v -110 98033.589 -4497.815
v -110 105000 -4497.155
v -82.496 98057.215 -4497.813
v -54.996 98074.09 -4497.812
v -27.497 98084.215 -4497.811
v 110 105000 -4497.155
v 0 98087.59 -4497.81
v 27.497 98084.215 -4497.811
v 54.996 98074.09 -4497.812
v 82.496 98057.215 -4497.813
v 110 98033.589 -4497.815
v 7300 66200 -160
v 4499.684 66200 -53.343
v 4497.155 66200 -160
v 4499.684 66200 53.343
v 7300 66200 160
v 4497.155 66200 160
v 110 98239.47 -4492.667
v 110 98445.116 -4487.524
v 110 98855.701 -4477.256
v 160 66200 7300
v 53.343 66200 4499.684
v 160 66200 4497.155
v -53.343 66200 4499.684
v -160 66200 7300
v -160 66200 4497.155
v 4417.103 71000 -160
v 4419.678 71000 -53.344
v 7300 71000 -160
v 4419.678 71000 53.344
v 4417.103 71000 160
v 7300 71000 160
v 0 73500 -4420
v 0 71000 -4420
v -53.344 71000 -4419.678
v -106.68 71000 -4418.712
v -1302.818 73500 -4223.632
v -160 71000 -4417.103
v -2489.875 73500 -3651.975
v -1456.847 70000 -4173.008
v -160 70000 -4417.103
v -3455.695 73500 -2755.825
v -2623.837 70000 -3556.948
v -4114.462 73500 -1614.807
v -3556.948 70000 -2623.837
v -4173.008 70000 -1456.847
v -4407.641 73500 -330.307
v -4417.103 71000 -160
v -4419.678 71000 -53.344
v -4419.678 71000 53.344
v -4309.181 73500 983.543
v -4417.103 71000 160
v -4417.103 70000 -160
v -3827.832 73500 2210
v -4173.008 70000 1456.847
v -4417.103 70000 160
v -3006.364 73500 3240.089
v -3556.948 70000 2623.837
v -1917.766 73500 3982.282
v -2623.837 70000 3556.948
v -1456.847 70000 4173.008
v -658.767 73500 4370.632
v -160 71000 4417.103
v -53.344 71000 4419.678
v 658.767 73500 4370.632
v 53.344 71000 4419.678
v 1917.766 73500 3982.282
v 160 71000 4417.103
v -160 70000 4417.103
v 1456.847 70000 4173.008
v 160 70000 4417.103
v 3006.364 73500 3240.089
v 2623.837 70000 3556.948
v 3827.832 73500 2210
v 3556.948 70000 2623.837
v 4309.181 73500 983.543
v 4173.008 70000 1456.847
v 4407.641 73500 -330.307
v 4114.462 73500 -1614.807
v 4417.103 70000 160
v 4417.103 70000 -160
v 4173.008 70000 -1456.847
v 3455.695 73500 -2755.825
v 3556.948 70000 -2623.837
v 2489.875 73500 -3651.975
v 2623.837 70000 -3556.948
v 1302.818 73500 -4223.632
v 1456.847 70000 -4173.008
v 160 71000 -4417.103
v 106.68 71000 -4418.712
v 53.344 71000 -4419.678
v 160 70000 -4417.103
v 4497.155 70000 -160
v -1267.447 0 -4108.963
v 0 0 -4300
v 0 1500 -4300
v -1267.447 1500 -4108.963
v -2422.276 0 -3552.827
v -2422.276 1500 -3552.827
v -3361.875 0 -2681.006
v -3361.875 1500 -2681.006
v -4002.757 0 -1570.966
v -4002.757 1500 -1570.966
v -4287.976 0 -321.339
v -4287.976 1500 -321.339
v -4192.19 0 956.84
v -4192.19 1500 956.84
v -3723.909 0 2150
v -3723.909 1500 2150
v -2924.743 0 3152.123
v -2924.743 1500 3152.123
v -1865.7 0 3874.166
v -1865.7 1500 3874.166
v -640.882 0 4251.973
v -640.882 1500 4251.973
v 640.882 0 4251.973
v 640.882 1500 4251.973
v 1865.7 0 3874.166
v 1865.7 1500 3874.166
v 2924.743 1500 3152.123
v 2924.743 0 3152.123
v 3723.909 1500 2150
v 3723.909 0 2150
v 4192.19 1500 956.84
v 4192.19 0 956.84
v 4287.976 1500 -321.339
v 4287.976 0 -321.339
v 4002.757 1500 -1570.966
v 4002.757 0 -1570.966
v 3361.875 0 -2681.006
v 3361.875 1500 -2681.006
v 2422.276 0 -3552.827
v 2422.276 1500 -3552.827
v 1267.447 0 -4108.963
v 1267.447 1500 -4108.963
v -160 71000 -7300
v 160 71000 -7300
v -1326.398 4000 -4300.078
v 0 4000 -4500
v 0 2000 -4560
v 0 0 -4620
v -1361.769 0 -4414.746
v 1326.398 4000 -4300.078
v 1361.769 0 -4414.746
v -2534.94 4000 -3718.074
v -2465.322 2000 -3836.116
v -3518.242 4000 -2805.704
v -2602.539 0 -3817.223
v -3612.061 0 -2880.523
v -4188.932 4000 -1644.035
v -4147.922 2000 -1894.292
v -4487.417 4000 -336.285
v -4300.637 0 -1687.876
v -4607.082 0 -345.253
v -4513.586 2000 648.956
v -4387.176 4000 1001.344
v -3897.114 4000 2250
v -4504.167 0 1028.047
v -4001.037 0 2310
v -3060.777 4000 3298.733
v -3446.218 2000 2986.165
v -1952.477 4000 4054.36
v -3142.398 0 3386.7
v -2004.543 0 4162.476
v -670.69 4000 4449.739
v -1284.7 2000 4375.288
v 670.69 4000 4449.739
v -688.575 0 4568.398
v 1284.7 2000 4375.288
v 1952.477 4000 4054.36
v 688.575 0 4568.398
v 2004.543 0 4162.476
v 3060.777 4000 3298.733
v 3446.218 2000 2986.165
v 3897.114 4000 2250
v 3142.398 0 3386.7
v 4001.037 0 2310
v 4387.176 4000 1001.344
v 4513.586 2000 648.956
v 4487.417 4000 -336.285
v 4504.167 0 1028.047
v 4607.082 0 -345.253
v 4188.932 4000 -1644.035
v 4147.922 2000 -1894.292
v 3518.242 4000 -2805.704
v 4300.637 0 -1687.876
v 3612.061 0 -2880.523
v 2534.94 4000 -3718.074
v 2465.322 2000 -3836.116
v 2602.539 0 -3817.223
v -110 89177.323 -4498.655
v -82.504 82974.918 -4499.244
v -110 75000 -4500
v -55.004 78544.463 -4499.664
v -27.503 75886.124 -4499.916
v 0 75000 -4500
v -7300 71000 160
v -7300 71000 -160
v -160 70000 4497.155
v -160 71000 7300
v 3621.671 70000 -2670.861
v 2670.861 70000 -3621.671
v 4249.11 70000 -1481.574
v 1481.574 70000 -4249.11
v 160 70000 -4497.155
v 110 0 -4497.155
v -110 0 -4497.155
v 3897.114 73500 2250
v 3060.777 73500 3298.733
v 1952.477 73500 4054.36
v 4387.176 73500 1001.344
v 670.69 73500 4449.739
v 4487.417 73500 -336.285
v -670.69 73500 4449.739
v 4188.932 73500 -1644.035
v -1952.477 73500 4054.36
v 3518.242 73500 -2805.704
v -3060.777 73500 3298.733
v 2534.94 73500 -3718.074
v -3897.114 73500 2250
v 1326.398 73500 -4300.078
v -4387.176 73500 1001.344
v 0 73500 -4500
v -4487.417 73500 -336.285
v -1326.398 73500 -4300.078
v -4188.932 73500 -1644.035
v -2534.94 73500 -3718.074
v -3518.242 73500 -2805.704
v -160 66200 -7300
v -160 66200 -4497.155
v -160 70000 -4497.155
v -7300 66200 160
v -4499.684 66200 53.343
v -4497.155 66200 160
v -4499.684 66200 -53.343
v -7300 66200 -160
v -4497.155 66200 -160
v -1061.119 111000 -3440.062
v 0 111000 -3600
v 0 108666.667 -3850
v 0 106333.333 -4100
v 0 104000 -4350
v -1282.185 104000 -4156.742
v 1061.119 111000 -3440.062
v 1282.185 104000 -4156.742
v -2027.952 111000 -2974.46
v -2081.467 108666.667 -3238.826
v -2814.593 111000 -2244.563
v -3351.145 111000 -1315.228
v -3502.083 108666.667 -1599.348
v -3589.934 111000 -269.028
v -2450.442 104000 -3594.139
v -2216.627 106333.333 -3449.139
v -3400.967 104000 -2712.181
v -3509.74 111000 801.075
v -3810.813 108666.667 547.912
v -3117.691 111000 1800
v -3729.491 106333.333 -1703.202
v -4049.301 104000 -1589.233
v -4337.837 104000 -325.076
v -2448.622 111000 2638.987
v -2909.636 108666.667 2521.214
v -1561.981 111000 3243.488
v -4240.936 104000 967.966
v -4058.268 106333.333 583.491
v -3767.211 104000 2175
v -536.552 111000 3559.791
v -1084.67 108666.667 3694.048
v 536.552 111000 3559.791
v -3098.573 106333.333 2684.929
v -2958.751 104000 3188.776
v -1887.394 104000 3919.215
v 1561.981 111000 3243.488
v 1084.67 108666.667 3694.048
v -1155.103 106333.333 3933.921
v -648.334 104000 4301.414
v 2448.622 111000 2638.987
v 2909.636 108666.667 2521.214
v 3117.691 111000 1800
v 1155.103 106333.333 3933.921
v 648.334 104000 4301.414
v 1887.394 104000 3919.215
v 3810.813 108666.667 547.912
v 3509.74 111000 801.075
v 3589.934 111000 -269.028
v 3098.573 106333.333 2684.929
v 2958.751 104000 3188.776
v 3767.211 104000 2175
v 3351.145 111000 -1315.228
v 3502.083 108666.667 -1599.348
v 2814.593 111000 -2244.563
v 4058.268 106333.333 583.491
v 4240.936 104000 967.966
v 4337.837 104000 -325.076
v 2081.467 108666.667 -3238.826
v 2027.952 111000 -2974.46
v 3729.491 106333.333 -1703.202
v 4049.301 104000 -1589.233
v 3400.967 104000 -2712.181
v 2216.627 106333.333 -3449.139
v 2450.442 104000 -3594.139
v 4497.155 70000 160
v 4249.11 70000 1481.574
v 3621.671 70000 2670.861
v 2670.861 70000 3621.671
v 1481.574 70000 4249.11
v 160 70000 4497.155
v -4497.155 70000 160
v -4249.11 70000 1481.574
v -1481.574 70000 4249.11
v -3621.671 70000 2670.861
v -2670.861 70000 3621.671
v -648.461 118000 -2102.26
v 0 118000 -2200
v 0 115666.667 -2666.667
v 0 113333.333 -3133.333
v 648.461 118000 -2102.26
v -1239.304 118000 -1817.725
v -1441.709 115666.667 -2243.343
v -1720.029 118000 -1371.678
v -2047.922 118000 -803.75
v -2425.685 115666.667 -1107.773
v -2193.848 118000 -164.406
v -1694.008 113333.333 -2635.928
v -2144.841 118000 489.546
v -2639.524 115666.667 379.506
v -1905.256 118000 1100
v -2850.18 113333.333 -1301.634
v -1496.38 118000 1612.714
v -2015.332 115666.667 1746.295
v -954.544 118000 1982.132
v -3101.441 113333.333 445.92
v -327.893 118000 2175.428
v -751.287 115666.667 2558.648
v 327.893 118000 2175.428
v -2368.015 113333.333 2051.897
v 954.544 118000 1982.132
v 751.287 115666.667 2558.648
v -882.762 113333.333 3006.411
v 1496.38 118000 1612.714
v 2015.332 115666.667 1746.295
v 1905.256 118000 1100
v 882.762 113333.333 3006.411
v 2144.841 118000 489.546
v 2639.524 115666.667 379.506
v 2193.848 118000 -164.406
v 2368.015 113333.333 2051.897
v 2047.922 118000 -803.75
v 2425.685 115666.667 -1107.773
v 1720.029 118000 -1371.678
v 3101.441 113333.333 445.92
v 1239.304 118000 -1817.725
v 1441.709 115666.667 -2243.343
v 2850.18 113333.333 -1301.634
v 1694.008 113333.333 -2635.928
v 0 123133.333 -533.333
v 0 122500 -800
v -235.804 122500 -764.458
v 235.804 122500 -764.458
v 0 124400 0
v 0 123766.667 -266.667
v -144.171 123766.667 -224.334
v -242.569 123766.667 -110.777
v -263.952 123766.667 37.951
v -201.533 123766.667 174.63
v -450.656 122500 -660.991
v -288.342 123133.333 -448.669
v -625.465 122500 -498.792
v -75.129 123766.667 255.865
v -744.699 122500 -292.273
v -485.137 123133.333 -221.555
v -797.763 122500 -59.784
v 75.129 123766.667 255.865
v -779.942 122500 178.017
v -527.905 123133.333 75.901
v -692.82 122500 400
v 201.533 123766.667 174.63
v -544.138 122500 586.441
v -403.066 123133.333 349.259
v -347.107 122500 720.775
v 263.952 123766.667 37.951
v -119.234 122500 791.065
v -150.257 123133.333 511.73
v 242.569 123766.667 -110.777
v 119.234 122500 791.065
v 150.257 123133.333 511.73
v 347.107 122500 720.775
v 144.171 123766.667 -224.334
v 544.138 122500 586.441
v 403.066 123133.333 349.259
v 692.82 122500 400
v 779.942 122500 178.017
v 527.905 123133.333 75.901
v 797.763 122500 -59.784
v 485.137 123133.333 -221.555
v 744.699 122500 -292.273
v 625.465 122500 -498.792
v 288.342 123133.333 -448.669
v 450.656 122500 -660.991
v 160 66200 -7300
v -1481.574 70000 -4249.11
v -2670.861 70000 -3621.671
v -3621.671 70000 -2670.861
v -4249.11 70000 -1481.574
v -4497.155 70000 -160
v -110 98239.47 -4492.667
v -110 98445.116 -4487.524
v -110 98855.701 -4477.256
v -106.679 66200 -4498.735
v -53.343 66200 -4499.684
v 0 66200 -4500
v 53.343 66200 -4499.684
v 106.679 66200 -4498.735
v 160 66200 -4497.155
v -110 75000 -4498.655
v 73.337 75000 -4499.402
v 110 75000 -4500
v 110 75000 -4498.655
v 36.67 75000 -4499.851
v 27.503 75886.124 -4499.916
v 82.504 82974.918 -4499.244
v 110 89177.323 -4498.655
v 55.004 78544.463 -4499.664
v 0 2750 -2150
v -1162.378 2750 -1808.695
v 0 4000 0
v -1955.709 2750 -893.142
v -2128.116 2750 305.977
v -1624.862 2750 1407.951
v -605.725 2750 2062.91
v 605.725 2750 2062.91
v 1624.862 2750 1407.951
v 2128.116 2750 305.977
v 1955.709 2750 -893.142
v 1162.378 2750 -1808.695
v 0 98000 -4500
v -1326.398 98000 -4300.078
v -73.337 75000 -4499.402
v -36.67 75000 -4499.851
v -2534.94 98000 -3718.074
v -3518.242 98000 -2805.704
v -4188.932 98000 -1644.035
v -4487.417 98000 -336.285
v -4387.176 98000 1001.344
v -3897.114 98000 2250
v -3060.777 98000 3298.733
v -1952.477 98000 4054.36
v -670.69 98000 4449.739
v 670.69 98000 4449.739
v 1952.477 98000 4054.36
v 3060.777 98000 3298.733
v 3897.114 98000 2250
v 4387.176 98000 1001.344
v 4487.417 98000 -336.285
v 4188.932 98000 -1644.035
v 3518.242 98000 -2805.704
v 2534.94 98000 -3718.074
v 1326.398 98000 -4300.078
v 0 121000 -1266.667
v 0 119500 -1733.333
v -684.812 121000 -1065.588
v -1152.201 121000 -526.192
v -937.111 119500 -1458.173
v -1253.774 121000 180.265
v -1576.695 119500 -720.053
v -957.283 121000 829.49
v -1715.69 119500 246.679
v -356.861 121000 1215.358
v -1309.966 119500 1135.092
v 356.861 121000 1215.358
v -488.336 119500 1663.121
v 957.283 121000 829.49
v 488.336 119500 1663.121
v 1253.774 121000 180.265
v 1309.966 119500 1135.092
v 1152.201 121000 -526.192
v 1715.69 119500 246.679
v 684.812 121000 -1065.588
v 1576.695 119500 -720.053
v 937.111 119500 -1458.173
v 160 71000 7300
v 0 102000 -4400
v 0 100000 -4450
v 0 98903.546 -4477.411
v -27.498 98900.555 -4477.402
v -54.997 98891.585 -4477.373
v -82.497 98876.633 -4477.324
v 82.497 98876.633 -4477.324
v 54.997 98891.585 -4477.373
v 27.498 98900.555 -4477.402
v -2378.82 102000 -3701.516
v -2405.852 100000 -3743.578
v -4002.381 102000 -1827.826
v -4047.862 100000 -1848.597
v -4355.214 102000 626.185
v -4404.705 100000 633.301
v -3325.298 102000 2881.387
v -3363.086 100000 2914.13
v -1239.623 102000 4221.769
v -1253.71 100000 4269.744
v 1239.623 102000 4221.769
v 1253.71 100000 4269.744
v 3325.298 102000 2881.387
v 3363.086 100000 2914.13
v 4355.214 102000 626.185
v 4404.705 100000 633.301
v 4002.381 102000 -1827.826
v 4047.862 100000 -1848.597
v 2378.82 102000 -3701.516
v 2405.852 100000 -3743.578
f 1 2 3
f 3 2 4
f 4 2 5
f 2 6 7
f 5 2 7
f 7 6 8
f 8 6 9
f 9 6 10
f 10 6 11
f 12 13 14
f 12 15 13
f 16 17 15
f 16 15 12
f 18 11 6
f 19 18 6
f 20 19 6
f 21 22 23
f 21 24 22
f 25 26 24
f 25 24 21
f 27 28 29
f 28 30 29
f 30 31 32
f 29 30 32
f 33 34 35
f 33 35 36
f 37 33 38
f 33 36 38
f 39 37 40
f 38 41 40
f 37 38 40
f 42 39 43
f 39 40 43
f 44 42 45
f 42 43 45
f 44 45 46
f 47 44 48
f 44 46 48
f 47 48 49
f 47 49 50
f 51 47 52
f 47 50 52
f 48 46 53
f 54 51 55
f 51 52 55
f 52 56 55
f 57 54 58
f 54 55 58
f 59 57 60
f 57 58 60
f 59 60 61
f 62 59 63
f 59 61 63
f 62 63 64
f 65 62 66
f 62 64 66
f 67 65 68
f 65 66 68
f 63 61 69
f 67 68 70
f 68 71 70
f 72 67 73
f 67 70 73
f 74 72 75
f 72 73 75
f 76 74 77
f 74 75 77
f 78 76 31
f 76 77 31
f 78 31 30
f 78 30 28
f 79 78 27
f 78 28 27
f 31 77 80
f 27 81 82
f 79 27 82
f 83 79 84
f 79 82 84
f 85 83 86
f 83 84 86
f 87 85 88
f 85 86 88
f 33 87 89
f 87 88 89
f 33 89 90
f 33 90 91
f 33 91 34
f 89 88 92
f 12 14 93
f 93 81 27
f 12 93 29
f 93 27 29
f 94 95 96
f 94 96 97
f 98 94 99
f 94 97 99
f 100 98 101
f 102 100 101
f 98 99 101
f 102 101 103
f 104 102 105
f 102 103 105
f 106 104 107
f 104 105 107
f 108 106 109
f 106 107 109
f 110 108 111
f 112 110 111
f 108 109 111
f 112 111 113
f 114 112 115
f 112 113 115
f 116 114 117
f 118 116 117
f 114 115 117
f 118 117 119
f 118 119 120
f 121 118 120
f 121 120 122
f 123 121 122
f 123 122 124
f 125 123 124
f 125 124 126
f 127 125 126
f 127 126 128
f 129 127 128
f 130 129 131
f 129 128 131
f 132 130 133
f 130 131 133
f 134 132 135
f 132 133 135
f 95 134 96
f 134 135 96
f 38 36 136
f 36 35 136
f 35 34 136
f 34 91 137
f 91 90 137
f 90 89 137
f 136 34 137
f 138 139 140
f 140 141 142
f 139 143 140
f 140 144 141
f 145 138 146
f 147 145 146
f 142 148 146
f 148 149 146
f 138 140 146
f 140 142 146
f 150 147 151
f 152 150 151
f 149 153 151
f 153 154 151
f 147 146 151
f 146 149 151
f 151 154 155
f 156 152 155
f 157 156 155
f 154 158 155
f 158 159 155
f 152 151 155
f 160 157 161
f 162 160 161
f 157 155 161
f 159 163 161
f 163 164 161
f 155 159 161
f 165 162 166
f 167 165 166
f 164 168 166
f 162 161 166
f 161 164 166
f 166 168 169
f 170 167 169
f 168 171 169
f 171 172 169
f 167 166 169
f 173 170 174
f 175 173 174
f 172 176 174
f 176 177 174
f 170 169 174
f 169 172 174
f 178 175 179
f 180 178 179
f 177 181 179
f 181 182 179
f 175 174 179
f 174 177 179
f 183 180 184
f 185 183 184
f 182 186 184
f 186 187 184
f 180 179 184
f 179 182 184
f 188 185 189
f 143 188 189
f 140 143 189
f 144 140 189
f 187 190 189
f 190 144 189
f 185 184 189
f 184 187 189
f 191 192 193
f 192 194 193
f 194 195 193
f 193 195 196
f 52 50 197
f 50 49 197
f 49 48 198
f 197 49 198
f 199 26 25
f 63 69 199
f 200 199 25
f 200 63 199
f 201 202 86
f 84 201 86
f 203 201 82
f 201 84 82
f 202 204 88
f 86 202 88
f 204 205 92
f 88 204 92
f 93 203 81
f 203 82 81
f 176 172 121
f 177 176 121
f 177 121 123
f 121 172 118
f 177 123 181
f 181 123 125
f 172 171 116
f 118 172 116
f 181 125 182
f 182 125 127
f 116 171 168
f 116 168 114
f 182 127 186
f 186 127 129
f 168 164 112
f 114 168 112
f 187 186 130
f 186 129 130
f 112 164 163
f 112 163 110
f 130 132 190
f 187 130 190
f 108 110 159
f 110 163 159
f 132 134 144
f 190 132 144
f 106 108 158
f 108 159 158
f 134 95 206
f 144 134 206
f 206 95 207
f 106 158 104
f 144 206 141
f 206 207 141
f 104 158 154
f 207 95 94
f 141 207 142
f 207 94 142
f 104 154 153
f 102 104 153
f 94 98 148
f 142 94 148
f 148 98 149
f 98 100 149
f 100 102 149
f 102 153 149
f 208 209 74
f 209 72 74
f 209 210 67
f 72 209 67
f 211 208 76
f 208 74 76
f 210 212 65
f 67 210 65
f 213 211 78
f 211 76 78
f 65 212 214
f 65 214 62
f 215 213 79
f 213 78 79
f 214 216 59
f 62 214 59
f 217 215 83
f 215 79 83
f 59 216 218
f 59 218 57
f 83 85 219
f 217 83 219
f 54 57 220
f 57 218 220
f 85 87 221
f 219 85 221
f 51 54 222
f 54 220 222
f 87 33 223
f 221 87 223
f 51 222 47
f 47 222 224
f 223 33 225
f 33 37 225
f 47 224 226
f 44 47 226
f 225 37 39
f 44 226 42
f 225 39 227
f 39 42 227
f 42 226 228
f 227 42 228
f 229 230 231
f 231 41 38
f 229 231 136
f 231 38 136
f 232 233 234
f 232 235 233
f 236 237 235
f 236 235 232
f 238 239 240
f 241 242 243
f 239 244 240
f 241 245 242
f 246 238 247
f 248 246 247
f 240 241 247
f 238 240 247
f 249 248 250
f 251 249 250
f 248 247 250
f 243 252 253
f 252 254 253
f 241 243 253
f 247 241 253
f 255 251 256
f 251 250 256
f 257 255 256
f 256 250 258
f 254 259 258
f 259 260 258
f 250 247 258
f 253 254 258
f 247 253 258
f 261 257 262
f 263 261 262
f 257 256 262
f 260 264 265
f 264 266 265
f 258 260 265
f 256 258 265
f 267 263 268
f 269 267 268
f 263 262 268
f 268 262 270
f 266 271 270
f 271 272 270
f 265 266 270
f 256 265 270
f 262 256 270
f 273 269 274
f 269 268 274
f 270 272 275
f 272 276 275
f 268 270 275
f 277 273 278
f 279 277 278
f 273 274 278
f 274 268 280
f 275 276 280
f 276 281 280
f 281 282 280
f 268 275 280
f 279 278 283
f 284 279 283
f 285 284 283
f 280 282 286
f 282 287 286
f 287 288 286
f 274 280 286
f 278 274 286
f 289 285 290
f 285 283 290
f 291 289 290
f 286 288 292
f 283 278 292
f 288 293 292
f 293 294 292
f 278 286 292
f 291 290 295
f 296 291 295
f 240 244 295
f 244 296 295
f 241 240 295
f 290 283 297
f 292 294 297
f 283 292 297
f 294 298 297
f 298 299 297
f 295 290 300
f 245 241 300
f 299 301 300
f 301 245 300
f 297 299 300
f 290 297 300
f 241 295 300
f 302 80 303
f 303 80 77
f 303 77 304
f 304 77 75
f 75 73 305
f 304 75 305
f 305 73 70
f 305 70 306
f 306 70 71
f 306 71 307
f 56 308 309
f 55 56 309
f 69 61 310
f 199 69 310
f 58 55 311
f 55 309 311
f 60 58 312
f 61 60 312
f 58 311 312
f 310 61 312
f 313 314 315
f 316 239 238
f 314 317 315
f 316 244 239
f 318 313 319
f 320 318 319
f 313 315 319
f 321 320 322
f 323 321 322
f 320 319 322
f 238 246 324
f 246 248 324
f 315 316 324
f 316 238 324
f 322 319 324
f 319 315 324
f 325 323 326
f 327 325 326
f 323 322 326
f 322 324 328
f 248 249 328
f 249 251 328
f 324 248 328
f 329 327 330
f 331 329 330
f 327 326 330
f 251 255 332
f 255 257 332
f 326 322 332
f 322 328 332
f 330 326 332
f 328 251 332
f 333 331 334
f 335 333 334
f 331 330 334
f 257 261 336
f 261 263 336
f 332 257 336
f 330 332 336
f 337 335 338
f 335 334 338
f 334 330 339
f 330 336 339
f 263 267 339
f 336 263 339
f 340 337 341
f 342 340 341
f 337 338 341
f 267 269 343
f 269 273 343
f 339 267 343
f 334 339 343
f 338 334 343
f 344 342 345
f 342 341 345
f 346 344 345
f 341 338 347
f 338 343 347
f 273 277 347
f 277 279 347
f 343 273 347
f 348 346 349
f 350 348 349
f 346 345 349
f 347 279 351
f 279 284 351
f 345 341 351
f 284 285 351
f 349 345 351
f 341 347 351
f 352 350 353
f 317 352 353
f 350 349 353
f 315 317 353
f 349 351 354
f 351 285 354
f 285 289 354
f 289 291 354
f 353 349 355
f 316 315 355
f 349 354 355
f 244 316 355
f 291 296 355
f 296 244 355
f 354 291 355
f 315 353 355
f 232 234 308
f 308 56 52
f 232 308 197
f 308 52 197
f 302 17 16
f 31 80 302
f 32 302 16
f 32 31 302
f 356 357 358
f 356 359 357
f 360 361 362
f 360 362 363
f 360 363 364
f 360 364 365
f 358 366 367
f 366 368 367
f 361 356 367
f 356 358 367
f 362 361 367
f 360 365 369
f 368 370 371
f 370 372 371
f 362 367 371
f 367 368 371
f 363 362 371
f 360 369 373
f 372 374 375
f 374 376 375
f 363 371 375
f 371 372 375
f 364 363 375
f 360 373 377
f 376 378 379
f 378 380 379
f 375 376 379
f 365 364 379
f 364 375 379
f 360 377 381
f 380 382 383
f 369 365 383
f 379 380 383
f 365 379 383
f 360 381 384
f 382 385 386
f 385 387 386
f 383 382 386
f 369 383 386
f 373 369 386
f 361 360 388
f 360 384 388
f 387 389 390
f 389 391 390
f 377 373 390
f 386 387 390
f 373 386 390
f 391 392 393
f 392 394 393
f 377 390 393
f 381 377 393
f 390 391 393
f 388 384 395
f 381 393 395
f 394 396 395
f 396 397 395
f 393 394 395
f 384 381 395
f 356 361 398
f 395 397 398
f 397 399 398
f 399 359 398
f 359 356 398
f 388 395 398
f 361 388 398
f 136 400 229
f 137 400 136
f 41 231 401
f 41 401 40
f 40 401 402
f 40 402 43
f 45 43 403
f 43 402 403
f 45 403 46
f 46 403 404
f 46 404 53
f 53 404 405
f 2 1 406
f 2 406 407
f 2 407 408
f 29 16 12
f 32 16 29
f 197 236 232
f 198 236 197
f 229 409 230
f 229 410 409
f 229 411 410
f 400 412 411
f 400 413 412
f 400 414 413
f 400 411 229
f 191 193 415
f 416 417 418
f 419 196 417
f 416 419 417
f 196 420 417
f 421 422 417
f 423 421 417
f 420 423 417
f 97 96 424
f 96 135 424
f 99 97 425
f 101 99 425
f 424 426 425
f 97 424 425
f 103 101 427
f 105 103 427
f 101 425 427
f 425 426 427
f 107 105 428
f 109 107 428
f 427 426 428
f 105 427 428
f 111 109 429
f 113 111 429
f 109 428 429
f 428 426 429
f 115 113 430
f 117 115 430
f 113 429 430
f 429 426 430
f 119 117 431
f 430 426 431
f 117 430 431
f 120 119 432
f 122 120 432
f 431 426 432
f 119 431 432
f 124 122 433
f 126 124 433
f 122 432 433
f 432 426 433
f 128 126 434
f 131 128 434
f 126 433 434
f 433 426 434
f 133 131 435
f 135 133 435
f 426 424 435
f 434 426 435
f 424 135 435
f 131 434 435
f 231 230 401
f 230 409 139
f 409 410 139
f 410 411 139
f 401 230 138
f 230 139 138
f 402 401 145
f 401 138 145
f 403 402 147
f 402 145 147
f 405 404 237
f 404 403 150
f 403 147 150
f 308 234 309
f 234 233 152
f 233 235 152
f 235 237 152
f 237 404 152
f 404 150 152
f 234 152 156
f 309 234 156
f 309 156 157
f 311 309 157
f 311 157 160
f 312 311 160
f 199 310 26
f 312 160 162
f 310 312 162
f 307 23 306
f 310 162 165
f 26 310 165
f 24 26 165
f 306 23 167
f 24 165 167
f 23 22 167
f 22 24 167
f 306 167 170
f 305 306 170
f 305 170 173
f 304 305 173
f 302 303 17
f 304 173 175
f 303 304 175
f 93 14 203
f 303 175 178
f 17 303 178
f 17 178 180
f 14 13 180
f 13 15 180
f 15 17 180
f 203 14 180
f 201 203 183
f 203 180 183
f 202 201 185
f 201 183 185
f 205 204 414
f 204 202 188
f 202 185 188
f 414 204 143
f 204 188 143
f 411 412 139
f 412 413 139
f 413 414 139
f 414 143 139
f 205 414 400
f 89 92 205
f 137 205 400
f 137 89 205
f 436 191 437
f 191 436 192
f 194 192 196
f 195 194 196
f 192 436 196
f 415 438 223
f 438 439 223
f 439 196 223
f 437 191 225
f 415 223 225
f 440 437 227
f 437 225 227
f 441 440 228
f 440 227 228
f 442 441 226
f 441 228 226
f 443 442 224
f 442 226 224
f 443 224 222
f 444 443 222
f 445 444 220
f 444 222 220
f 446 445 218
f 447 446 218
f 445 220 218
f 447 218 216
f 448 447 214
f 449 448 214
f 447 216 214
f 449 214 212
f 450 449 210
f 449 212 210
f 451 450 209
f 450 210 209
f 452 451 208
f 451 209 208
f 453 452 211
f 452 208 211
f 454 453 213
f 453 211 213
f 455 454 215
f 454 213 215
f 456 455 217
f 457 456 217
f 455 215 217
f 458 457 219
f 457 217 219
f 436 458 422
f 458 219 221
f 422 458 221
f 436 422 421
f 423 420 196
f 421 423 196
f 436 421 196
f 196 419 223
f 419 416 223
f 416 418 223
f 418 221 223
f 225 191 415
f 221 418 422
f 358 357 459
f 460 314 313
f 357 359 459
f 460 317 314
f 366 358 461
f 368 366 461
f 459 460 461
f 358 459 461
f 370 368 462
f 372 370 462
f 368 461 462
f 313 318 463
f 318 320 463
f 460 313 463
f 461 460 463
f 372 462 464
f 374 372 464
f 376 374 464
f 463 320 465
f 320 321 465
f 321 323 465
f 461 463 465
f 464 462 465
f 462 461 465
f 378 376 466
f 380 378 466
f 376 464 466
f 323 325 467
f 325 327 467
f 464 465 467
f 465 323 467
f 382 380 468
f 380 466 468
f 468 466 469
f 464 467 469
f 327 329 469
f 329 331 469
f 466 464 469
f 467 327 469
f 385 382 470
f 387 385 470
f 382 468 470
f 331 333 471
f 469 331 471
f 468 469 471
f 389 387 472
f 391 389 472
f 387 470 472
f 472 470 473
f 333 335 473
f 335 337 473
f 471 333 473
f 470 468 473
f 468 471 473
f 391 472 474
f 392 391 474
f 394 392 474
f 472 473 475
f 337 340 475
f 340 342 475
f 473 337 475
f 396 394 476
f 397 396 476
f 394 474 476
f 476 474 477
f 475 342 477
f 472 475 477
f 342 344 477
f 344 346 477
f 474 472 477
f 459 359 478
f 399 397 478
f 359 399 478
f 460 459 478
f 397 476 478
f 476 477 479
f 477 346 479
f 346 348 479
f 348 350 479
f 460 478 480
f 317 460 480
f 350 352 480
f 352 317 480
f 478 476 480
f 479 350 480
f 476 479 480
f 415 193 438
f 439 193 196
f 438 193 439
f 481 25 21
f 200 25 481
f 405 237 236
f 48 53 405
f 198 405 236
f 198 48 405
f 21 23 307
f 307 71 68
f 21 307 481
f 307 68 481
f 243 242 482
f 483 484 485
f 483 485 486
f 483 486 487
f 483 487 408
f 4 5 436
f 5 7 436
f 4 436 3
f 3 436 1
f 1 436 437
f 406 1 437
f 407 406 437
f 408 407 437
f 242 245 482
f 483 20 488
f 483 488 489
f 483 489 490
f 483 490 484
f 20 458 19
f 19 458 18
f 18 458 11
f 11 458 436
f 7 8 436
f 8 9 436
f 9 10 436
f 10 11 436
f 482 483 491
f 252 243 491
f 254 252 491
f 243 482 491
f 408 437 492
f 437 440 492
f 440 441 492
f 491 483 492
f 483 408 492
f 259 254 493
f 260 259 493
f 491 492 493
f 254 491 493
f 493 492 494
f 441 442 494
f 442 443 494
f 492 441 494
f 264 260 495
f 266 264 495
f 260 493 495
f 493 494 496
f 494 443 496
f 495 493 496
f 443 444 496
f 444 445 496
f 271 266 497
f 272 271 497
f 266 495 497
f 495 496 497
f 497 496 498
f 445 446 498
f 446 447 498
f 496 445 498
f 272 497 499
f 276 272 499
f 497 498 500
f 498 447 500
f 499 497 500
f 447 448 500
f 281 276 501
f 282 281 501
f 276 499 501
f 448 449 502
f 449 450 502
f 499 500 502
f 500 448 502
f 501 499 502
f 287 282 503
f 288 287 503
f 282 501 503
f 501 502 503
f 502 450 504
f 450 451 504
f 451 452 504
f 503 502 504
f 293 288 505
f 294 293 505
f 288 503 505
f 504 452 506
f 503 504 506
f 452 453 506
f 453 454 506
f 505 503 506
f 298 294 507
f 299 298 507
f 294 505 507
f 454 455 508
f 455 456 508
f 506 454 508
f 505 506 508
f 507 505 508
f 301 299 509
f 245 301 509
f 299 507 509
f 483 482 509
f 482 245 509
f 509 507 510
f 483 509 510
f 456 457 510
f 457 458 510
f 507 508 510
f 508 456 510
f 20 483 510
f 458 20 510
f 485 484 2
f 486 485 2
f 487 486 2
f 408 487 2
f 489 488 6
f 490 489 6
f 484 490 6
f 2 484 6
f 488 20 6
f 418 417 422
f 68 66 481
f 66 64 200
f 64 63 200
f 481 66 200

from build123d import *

# Parameters (mm, degrees)
SKETCH4_W           = 3500
SKETCH4_H           = 4800
BOSS_EXTRUDE1_DEPTH = 160
CIRPATTERN1_COUNT   = 4
BOSS_EXTRUDE4_DEPTH = 110


with BuildPart() as part:
    # Sketch1 → Revolve1 (revolve)
    with BuildSketch(Plane.XY, mode=Mode.PRIVATE) as revolve1_sk:
        Polygon((0, 124400), (800, 122500), (2200, 118000), (3600, 111000), (4350, 104000), (4500, 98000), (4500, 73500), (4420, 73500), (4420, 70000), (4500, 70000), (4500, 4000), (4620, 0), (4300, 0), (4300, 1500), (0, 4000), align=None)
    revolve(revolve1_sk.sketch.rotate(Axis((0, 0, 0), (0, 1, 0)), 90), axis=Axis((0, 0, 0), (0, 1, 0)))

    # Sketch4 → Boss-Extrude1 (add, symmetric)
    with BuildSketch(Plane.XY):
        with Locations((5550, 68600)):
            Rectangle(SKETCH4_W, SKETCH4_H)
    boss_extrude1 = extrude(amount=BOSS_EXTRUDE1_DEPTH, both=True)

    # CirPattern1: Boss-Extrude1 ×4 about axis
    cirpattern1_axis = Axis((0, 0, 0), (0, 1, 0))
    for i in range(1, CIRPATTERN1_COUNT):
        add(boss_extrude1.rotate(cirpattern1_axis, i * 360 / CIRPATTERN1_COUNT))

    # Sketch6 → Boss-Extrude4 (add, symmetric)
    with BuildSketch(Plane(origin=(0, 0, 0), x_dir=(0, 0, -1), z_dir=(1, 0, 0))):
        Polygon((4497.154656002, 70000), (4497.154656002, 0), (4400, 2000), align=None)
        Polygon((4497.154656002, 105000), (4500, 75000), (4400, 75000), align=None)
    extrude(amount=BOSS_EXTRUDE4_DEPTH, both=True)


solid = part.part
